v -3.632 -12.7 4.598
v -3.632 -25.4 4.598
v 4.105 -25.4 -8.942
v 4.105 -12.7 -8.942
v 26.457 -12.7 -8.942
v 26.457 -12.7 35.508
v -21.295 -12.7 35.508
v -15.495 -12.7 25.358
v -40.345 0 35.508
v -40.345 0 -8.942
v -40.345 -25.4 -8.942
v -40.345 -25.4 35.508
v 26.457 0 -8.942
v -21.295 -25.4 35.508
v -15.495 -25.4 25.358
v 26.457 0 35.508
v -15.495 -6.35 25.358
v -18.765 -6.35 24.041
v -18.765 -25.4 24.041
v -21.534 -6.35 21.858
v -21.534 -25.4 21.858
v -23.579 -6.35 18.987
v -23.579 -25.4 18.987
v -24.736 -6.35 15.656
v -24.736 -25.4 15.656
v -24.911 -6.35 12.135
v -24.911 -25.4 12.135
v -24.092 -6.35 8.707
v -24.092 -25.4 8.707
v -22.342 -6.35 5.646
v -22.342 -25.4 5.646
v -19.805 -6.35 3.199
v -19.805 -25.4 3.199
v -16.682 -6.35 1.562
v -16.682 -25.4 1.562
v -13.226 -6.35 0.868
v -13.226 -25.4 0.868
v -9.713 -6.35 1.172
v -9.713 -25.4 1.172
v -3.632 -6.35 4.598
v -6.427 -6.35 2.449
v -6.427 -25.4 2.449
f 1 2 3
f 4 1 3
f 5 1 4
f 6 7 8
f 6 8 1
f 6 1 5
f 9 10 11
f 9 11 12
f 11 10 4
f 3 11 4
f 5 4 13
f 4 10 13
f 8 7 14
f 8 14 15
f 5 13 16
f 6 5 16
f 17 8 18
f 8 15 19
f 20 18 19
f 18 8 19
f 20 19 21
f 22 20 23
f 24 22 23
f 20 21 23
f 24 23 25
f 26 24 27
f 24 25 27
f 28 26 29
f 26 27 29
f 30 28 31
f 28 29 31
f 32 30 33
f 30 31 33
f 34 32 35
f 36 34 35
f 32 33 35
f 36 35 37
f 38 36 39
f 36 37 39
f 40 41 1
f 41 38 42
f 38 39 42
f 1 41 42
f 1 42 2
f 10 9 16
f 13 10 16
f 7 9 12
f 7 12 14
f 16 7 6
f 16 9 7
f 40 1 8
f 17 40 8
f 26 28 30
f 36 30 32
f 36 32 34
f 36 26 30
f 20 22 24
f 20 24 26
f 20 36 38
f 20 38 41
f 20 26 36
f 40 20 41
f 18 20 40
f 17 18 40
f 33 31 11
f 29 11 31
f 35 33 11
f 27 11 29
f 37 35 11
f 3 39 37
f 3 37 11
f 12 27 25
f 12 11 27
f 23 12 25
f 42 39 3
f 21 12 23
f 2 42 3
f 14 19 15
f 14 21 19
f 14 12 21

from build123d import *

# Parameters (mm, degrees)
F0_W     = 66.8018609285
F0_H     = 44.45
F1_DEPTH = 25.4
F3_DEPTH = 12.7
F5_DEPTH = 19.05


with BuildPart() as f1:
    # F0 (on Front) → F1 (new body)
    with BuildSketch(Plane.XZ):
        with Locations((-6.9442056119, 13.2829286516)):
            Rectangle(F0_W, F0_H)
    extrude(amount=F1_DEPTH)

    # F2 (on face) → F3 (cut)
    with BuildSketch(Plane.XZ.offset(25.4)):
        Polygon((26.4567248523, 35.5079286516), (-21.2951360762, 35.5079286516), (4.1048639238, -8.9420713484), (26.4567248523, -8.9420713484), align=None)
    extrude(amount=-F3_DEPTH, mode=Mode.SUBTRACT)

    # F4 (on face) → F5 (cut)
    with BuildSketch(Plane.XZ.offset(25.4)):
        with BuildLine():
            Line((-3.6320969141, 4.5976101178), (-15.4953949278, 25.3583816418))
            ThreePointArc((-15.4953949278, 25.3583816418), (-23.3260269454, 7.1138352944), (-3.6320969141, 4.5976101178))
        make_face()
    extrude(amount=-F5_DEPTH, mode=Mode.SUBTRACT)


solid = f1.part
